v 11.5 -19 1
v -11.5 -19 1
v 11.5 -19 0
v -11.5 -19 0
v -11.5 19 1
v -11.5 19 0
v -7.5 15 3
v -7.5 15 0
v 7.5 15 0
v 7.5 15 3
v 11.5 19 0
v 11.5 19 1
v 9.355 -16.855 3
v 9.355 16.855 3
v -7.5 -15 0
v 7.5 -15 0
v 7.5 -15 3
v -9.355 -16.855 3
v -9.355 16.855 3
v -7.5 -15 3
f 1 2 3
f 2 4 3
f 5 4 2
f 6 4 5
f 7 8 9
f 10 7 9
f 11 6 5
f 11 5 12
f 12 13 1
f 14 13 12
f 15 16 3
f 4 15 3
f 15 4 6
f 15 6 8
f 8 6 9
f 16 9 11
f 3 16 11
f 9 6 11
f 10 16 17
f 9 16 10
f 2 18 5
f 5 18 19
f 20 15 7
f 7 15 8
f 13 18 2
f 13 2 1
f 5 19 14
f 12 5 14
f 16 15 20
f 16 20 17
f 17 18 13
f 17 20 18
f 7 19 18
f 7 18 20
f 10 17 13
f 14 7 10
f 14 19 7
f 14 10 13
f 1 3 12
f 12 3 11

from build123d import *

# Parameters (mm, degrees)
ESBO_O1_W                = 23
ESBO_O1_H                = 38
ESBO_O1_W_2              = 15
ESBO_O1_H_2              = 30
RESSALTO_EXTRUS_O1_DEPTH = 3
CHANFRO1_SIZE            = 2
CHANFRO1_SIZE2           = 2.14473742
CHANFRO1_PART_2_SIZE     = 2
CHANFRO1_PART_2_SIZE2    = 2.14473742
CHANFRO1_PART_3_SIZE     = 2
CHANFRO1_PART_3_SIZE2    = 2.14473742
CHANFRO1_PART_4_SIZE     = 2
CHANFRO1_PART_4_SIZE2    = 2.14473742


with BuildPart() as part:
    # Esboço1 → Ressalto-extrusão1 (new body)
    with BuildSketch(Plane.XY):
        Rectangle(ESBO_O1_W, ESBO_O1_H)
        Rectangle(ESBO_O1_W_2, ESBO_O1_H_2, mode=Mode.SUBTRACT)
    extrude(amount=RESSALTO_EXTRUS_O1_DEPTH)

    # Chanfro1
    chanfro1_edges = [part.edges().sort_by_distance(p)[0] for p in [
        (11.5, 0, 3),
    ]]
    chanfro1_side = [part.faces().sort_by_distance(p)[0] for p in [
        (11.5, 0, 1.5),
    ]]
    chamfer(chanfro1_edges, length=CHANFRO1_SIZE, length2=CHANFRO1_SIZE2, reference=chanfro1_side[0])

    # Chanfro1 part 2
    chanfro1_part_2_edges = [part.edges().sort_by_distance(p)[0] for p in [
        (0, 19, 3),
    ]]
    chanfro1_part_2_side = [part.faces().sort_by_distance(p)[0] for p in [
        (0, 19, 1.5),
    ]]
    chamfer(chanfro1_part_2_edges, length=CHANFRO1_PART_2_SIZE, length2=CHANFRO1_PART_2_SIZE2, reference=chanfro1_part_2_side[0])

    # Chanfro1 part 3
    chanfro1_part_3_edges = [part.edges().sort_by_distance(p)[0] for p in [
        (-11.5, 0, 3),
    ]]
    chanfro1_part_3_side = [part.faces().sort_by_distance(p)[0] for p in [
        (-11.5, 0, 1.5),
    ]]
    chamfer(chanfro1_part_3_edges, length=CHANFRO1_PART_3_SIZE, length2=CHANFRO1_PART_3_SIZE2, reference=chanfro1_part_3_side[0])

    # Chanfro1 part 4
    chanfro1_part_4_edges = [part.edges().sort_by_distance(p)[0] for p in [
        (0, -19, 3),
    ]]
    chanfro1_part_4_side = [part.faces().sort_by_distance(p)[0] for p in [
        (0, -19, 1.5),
    ]]
    chamfer(chanfro1_part_4_edges, length=CHANFRO1_PART_4_SIZE, length2=CHANFRO1_PART_4_SIZE2, reference=chanfro1_part_4_side[0])


solid = part.part
